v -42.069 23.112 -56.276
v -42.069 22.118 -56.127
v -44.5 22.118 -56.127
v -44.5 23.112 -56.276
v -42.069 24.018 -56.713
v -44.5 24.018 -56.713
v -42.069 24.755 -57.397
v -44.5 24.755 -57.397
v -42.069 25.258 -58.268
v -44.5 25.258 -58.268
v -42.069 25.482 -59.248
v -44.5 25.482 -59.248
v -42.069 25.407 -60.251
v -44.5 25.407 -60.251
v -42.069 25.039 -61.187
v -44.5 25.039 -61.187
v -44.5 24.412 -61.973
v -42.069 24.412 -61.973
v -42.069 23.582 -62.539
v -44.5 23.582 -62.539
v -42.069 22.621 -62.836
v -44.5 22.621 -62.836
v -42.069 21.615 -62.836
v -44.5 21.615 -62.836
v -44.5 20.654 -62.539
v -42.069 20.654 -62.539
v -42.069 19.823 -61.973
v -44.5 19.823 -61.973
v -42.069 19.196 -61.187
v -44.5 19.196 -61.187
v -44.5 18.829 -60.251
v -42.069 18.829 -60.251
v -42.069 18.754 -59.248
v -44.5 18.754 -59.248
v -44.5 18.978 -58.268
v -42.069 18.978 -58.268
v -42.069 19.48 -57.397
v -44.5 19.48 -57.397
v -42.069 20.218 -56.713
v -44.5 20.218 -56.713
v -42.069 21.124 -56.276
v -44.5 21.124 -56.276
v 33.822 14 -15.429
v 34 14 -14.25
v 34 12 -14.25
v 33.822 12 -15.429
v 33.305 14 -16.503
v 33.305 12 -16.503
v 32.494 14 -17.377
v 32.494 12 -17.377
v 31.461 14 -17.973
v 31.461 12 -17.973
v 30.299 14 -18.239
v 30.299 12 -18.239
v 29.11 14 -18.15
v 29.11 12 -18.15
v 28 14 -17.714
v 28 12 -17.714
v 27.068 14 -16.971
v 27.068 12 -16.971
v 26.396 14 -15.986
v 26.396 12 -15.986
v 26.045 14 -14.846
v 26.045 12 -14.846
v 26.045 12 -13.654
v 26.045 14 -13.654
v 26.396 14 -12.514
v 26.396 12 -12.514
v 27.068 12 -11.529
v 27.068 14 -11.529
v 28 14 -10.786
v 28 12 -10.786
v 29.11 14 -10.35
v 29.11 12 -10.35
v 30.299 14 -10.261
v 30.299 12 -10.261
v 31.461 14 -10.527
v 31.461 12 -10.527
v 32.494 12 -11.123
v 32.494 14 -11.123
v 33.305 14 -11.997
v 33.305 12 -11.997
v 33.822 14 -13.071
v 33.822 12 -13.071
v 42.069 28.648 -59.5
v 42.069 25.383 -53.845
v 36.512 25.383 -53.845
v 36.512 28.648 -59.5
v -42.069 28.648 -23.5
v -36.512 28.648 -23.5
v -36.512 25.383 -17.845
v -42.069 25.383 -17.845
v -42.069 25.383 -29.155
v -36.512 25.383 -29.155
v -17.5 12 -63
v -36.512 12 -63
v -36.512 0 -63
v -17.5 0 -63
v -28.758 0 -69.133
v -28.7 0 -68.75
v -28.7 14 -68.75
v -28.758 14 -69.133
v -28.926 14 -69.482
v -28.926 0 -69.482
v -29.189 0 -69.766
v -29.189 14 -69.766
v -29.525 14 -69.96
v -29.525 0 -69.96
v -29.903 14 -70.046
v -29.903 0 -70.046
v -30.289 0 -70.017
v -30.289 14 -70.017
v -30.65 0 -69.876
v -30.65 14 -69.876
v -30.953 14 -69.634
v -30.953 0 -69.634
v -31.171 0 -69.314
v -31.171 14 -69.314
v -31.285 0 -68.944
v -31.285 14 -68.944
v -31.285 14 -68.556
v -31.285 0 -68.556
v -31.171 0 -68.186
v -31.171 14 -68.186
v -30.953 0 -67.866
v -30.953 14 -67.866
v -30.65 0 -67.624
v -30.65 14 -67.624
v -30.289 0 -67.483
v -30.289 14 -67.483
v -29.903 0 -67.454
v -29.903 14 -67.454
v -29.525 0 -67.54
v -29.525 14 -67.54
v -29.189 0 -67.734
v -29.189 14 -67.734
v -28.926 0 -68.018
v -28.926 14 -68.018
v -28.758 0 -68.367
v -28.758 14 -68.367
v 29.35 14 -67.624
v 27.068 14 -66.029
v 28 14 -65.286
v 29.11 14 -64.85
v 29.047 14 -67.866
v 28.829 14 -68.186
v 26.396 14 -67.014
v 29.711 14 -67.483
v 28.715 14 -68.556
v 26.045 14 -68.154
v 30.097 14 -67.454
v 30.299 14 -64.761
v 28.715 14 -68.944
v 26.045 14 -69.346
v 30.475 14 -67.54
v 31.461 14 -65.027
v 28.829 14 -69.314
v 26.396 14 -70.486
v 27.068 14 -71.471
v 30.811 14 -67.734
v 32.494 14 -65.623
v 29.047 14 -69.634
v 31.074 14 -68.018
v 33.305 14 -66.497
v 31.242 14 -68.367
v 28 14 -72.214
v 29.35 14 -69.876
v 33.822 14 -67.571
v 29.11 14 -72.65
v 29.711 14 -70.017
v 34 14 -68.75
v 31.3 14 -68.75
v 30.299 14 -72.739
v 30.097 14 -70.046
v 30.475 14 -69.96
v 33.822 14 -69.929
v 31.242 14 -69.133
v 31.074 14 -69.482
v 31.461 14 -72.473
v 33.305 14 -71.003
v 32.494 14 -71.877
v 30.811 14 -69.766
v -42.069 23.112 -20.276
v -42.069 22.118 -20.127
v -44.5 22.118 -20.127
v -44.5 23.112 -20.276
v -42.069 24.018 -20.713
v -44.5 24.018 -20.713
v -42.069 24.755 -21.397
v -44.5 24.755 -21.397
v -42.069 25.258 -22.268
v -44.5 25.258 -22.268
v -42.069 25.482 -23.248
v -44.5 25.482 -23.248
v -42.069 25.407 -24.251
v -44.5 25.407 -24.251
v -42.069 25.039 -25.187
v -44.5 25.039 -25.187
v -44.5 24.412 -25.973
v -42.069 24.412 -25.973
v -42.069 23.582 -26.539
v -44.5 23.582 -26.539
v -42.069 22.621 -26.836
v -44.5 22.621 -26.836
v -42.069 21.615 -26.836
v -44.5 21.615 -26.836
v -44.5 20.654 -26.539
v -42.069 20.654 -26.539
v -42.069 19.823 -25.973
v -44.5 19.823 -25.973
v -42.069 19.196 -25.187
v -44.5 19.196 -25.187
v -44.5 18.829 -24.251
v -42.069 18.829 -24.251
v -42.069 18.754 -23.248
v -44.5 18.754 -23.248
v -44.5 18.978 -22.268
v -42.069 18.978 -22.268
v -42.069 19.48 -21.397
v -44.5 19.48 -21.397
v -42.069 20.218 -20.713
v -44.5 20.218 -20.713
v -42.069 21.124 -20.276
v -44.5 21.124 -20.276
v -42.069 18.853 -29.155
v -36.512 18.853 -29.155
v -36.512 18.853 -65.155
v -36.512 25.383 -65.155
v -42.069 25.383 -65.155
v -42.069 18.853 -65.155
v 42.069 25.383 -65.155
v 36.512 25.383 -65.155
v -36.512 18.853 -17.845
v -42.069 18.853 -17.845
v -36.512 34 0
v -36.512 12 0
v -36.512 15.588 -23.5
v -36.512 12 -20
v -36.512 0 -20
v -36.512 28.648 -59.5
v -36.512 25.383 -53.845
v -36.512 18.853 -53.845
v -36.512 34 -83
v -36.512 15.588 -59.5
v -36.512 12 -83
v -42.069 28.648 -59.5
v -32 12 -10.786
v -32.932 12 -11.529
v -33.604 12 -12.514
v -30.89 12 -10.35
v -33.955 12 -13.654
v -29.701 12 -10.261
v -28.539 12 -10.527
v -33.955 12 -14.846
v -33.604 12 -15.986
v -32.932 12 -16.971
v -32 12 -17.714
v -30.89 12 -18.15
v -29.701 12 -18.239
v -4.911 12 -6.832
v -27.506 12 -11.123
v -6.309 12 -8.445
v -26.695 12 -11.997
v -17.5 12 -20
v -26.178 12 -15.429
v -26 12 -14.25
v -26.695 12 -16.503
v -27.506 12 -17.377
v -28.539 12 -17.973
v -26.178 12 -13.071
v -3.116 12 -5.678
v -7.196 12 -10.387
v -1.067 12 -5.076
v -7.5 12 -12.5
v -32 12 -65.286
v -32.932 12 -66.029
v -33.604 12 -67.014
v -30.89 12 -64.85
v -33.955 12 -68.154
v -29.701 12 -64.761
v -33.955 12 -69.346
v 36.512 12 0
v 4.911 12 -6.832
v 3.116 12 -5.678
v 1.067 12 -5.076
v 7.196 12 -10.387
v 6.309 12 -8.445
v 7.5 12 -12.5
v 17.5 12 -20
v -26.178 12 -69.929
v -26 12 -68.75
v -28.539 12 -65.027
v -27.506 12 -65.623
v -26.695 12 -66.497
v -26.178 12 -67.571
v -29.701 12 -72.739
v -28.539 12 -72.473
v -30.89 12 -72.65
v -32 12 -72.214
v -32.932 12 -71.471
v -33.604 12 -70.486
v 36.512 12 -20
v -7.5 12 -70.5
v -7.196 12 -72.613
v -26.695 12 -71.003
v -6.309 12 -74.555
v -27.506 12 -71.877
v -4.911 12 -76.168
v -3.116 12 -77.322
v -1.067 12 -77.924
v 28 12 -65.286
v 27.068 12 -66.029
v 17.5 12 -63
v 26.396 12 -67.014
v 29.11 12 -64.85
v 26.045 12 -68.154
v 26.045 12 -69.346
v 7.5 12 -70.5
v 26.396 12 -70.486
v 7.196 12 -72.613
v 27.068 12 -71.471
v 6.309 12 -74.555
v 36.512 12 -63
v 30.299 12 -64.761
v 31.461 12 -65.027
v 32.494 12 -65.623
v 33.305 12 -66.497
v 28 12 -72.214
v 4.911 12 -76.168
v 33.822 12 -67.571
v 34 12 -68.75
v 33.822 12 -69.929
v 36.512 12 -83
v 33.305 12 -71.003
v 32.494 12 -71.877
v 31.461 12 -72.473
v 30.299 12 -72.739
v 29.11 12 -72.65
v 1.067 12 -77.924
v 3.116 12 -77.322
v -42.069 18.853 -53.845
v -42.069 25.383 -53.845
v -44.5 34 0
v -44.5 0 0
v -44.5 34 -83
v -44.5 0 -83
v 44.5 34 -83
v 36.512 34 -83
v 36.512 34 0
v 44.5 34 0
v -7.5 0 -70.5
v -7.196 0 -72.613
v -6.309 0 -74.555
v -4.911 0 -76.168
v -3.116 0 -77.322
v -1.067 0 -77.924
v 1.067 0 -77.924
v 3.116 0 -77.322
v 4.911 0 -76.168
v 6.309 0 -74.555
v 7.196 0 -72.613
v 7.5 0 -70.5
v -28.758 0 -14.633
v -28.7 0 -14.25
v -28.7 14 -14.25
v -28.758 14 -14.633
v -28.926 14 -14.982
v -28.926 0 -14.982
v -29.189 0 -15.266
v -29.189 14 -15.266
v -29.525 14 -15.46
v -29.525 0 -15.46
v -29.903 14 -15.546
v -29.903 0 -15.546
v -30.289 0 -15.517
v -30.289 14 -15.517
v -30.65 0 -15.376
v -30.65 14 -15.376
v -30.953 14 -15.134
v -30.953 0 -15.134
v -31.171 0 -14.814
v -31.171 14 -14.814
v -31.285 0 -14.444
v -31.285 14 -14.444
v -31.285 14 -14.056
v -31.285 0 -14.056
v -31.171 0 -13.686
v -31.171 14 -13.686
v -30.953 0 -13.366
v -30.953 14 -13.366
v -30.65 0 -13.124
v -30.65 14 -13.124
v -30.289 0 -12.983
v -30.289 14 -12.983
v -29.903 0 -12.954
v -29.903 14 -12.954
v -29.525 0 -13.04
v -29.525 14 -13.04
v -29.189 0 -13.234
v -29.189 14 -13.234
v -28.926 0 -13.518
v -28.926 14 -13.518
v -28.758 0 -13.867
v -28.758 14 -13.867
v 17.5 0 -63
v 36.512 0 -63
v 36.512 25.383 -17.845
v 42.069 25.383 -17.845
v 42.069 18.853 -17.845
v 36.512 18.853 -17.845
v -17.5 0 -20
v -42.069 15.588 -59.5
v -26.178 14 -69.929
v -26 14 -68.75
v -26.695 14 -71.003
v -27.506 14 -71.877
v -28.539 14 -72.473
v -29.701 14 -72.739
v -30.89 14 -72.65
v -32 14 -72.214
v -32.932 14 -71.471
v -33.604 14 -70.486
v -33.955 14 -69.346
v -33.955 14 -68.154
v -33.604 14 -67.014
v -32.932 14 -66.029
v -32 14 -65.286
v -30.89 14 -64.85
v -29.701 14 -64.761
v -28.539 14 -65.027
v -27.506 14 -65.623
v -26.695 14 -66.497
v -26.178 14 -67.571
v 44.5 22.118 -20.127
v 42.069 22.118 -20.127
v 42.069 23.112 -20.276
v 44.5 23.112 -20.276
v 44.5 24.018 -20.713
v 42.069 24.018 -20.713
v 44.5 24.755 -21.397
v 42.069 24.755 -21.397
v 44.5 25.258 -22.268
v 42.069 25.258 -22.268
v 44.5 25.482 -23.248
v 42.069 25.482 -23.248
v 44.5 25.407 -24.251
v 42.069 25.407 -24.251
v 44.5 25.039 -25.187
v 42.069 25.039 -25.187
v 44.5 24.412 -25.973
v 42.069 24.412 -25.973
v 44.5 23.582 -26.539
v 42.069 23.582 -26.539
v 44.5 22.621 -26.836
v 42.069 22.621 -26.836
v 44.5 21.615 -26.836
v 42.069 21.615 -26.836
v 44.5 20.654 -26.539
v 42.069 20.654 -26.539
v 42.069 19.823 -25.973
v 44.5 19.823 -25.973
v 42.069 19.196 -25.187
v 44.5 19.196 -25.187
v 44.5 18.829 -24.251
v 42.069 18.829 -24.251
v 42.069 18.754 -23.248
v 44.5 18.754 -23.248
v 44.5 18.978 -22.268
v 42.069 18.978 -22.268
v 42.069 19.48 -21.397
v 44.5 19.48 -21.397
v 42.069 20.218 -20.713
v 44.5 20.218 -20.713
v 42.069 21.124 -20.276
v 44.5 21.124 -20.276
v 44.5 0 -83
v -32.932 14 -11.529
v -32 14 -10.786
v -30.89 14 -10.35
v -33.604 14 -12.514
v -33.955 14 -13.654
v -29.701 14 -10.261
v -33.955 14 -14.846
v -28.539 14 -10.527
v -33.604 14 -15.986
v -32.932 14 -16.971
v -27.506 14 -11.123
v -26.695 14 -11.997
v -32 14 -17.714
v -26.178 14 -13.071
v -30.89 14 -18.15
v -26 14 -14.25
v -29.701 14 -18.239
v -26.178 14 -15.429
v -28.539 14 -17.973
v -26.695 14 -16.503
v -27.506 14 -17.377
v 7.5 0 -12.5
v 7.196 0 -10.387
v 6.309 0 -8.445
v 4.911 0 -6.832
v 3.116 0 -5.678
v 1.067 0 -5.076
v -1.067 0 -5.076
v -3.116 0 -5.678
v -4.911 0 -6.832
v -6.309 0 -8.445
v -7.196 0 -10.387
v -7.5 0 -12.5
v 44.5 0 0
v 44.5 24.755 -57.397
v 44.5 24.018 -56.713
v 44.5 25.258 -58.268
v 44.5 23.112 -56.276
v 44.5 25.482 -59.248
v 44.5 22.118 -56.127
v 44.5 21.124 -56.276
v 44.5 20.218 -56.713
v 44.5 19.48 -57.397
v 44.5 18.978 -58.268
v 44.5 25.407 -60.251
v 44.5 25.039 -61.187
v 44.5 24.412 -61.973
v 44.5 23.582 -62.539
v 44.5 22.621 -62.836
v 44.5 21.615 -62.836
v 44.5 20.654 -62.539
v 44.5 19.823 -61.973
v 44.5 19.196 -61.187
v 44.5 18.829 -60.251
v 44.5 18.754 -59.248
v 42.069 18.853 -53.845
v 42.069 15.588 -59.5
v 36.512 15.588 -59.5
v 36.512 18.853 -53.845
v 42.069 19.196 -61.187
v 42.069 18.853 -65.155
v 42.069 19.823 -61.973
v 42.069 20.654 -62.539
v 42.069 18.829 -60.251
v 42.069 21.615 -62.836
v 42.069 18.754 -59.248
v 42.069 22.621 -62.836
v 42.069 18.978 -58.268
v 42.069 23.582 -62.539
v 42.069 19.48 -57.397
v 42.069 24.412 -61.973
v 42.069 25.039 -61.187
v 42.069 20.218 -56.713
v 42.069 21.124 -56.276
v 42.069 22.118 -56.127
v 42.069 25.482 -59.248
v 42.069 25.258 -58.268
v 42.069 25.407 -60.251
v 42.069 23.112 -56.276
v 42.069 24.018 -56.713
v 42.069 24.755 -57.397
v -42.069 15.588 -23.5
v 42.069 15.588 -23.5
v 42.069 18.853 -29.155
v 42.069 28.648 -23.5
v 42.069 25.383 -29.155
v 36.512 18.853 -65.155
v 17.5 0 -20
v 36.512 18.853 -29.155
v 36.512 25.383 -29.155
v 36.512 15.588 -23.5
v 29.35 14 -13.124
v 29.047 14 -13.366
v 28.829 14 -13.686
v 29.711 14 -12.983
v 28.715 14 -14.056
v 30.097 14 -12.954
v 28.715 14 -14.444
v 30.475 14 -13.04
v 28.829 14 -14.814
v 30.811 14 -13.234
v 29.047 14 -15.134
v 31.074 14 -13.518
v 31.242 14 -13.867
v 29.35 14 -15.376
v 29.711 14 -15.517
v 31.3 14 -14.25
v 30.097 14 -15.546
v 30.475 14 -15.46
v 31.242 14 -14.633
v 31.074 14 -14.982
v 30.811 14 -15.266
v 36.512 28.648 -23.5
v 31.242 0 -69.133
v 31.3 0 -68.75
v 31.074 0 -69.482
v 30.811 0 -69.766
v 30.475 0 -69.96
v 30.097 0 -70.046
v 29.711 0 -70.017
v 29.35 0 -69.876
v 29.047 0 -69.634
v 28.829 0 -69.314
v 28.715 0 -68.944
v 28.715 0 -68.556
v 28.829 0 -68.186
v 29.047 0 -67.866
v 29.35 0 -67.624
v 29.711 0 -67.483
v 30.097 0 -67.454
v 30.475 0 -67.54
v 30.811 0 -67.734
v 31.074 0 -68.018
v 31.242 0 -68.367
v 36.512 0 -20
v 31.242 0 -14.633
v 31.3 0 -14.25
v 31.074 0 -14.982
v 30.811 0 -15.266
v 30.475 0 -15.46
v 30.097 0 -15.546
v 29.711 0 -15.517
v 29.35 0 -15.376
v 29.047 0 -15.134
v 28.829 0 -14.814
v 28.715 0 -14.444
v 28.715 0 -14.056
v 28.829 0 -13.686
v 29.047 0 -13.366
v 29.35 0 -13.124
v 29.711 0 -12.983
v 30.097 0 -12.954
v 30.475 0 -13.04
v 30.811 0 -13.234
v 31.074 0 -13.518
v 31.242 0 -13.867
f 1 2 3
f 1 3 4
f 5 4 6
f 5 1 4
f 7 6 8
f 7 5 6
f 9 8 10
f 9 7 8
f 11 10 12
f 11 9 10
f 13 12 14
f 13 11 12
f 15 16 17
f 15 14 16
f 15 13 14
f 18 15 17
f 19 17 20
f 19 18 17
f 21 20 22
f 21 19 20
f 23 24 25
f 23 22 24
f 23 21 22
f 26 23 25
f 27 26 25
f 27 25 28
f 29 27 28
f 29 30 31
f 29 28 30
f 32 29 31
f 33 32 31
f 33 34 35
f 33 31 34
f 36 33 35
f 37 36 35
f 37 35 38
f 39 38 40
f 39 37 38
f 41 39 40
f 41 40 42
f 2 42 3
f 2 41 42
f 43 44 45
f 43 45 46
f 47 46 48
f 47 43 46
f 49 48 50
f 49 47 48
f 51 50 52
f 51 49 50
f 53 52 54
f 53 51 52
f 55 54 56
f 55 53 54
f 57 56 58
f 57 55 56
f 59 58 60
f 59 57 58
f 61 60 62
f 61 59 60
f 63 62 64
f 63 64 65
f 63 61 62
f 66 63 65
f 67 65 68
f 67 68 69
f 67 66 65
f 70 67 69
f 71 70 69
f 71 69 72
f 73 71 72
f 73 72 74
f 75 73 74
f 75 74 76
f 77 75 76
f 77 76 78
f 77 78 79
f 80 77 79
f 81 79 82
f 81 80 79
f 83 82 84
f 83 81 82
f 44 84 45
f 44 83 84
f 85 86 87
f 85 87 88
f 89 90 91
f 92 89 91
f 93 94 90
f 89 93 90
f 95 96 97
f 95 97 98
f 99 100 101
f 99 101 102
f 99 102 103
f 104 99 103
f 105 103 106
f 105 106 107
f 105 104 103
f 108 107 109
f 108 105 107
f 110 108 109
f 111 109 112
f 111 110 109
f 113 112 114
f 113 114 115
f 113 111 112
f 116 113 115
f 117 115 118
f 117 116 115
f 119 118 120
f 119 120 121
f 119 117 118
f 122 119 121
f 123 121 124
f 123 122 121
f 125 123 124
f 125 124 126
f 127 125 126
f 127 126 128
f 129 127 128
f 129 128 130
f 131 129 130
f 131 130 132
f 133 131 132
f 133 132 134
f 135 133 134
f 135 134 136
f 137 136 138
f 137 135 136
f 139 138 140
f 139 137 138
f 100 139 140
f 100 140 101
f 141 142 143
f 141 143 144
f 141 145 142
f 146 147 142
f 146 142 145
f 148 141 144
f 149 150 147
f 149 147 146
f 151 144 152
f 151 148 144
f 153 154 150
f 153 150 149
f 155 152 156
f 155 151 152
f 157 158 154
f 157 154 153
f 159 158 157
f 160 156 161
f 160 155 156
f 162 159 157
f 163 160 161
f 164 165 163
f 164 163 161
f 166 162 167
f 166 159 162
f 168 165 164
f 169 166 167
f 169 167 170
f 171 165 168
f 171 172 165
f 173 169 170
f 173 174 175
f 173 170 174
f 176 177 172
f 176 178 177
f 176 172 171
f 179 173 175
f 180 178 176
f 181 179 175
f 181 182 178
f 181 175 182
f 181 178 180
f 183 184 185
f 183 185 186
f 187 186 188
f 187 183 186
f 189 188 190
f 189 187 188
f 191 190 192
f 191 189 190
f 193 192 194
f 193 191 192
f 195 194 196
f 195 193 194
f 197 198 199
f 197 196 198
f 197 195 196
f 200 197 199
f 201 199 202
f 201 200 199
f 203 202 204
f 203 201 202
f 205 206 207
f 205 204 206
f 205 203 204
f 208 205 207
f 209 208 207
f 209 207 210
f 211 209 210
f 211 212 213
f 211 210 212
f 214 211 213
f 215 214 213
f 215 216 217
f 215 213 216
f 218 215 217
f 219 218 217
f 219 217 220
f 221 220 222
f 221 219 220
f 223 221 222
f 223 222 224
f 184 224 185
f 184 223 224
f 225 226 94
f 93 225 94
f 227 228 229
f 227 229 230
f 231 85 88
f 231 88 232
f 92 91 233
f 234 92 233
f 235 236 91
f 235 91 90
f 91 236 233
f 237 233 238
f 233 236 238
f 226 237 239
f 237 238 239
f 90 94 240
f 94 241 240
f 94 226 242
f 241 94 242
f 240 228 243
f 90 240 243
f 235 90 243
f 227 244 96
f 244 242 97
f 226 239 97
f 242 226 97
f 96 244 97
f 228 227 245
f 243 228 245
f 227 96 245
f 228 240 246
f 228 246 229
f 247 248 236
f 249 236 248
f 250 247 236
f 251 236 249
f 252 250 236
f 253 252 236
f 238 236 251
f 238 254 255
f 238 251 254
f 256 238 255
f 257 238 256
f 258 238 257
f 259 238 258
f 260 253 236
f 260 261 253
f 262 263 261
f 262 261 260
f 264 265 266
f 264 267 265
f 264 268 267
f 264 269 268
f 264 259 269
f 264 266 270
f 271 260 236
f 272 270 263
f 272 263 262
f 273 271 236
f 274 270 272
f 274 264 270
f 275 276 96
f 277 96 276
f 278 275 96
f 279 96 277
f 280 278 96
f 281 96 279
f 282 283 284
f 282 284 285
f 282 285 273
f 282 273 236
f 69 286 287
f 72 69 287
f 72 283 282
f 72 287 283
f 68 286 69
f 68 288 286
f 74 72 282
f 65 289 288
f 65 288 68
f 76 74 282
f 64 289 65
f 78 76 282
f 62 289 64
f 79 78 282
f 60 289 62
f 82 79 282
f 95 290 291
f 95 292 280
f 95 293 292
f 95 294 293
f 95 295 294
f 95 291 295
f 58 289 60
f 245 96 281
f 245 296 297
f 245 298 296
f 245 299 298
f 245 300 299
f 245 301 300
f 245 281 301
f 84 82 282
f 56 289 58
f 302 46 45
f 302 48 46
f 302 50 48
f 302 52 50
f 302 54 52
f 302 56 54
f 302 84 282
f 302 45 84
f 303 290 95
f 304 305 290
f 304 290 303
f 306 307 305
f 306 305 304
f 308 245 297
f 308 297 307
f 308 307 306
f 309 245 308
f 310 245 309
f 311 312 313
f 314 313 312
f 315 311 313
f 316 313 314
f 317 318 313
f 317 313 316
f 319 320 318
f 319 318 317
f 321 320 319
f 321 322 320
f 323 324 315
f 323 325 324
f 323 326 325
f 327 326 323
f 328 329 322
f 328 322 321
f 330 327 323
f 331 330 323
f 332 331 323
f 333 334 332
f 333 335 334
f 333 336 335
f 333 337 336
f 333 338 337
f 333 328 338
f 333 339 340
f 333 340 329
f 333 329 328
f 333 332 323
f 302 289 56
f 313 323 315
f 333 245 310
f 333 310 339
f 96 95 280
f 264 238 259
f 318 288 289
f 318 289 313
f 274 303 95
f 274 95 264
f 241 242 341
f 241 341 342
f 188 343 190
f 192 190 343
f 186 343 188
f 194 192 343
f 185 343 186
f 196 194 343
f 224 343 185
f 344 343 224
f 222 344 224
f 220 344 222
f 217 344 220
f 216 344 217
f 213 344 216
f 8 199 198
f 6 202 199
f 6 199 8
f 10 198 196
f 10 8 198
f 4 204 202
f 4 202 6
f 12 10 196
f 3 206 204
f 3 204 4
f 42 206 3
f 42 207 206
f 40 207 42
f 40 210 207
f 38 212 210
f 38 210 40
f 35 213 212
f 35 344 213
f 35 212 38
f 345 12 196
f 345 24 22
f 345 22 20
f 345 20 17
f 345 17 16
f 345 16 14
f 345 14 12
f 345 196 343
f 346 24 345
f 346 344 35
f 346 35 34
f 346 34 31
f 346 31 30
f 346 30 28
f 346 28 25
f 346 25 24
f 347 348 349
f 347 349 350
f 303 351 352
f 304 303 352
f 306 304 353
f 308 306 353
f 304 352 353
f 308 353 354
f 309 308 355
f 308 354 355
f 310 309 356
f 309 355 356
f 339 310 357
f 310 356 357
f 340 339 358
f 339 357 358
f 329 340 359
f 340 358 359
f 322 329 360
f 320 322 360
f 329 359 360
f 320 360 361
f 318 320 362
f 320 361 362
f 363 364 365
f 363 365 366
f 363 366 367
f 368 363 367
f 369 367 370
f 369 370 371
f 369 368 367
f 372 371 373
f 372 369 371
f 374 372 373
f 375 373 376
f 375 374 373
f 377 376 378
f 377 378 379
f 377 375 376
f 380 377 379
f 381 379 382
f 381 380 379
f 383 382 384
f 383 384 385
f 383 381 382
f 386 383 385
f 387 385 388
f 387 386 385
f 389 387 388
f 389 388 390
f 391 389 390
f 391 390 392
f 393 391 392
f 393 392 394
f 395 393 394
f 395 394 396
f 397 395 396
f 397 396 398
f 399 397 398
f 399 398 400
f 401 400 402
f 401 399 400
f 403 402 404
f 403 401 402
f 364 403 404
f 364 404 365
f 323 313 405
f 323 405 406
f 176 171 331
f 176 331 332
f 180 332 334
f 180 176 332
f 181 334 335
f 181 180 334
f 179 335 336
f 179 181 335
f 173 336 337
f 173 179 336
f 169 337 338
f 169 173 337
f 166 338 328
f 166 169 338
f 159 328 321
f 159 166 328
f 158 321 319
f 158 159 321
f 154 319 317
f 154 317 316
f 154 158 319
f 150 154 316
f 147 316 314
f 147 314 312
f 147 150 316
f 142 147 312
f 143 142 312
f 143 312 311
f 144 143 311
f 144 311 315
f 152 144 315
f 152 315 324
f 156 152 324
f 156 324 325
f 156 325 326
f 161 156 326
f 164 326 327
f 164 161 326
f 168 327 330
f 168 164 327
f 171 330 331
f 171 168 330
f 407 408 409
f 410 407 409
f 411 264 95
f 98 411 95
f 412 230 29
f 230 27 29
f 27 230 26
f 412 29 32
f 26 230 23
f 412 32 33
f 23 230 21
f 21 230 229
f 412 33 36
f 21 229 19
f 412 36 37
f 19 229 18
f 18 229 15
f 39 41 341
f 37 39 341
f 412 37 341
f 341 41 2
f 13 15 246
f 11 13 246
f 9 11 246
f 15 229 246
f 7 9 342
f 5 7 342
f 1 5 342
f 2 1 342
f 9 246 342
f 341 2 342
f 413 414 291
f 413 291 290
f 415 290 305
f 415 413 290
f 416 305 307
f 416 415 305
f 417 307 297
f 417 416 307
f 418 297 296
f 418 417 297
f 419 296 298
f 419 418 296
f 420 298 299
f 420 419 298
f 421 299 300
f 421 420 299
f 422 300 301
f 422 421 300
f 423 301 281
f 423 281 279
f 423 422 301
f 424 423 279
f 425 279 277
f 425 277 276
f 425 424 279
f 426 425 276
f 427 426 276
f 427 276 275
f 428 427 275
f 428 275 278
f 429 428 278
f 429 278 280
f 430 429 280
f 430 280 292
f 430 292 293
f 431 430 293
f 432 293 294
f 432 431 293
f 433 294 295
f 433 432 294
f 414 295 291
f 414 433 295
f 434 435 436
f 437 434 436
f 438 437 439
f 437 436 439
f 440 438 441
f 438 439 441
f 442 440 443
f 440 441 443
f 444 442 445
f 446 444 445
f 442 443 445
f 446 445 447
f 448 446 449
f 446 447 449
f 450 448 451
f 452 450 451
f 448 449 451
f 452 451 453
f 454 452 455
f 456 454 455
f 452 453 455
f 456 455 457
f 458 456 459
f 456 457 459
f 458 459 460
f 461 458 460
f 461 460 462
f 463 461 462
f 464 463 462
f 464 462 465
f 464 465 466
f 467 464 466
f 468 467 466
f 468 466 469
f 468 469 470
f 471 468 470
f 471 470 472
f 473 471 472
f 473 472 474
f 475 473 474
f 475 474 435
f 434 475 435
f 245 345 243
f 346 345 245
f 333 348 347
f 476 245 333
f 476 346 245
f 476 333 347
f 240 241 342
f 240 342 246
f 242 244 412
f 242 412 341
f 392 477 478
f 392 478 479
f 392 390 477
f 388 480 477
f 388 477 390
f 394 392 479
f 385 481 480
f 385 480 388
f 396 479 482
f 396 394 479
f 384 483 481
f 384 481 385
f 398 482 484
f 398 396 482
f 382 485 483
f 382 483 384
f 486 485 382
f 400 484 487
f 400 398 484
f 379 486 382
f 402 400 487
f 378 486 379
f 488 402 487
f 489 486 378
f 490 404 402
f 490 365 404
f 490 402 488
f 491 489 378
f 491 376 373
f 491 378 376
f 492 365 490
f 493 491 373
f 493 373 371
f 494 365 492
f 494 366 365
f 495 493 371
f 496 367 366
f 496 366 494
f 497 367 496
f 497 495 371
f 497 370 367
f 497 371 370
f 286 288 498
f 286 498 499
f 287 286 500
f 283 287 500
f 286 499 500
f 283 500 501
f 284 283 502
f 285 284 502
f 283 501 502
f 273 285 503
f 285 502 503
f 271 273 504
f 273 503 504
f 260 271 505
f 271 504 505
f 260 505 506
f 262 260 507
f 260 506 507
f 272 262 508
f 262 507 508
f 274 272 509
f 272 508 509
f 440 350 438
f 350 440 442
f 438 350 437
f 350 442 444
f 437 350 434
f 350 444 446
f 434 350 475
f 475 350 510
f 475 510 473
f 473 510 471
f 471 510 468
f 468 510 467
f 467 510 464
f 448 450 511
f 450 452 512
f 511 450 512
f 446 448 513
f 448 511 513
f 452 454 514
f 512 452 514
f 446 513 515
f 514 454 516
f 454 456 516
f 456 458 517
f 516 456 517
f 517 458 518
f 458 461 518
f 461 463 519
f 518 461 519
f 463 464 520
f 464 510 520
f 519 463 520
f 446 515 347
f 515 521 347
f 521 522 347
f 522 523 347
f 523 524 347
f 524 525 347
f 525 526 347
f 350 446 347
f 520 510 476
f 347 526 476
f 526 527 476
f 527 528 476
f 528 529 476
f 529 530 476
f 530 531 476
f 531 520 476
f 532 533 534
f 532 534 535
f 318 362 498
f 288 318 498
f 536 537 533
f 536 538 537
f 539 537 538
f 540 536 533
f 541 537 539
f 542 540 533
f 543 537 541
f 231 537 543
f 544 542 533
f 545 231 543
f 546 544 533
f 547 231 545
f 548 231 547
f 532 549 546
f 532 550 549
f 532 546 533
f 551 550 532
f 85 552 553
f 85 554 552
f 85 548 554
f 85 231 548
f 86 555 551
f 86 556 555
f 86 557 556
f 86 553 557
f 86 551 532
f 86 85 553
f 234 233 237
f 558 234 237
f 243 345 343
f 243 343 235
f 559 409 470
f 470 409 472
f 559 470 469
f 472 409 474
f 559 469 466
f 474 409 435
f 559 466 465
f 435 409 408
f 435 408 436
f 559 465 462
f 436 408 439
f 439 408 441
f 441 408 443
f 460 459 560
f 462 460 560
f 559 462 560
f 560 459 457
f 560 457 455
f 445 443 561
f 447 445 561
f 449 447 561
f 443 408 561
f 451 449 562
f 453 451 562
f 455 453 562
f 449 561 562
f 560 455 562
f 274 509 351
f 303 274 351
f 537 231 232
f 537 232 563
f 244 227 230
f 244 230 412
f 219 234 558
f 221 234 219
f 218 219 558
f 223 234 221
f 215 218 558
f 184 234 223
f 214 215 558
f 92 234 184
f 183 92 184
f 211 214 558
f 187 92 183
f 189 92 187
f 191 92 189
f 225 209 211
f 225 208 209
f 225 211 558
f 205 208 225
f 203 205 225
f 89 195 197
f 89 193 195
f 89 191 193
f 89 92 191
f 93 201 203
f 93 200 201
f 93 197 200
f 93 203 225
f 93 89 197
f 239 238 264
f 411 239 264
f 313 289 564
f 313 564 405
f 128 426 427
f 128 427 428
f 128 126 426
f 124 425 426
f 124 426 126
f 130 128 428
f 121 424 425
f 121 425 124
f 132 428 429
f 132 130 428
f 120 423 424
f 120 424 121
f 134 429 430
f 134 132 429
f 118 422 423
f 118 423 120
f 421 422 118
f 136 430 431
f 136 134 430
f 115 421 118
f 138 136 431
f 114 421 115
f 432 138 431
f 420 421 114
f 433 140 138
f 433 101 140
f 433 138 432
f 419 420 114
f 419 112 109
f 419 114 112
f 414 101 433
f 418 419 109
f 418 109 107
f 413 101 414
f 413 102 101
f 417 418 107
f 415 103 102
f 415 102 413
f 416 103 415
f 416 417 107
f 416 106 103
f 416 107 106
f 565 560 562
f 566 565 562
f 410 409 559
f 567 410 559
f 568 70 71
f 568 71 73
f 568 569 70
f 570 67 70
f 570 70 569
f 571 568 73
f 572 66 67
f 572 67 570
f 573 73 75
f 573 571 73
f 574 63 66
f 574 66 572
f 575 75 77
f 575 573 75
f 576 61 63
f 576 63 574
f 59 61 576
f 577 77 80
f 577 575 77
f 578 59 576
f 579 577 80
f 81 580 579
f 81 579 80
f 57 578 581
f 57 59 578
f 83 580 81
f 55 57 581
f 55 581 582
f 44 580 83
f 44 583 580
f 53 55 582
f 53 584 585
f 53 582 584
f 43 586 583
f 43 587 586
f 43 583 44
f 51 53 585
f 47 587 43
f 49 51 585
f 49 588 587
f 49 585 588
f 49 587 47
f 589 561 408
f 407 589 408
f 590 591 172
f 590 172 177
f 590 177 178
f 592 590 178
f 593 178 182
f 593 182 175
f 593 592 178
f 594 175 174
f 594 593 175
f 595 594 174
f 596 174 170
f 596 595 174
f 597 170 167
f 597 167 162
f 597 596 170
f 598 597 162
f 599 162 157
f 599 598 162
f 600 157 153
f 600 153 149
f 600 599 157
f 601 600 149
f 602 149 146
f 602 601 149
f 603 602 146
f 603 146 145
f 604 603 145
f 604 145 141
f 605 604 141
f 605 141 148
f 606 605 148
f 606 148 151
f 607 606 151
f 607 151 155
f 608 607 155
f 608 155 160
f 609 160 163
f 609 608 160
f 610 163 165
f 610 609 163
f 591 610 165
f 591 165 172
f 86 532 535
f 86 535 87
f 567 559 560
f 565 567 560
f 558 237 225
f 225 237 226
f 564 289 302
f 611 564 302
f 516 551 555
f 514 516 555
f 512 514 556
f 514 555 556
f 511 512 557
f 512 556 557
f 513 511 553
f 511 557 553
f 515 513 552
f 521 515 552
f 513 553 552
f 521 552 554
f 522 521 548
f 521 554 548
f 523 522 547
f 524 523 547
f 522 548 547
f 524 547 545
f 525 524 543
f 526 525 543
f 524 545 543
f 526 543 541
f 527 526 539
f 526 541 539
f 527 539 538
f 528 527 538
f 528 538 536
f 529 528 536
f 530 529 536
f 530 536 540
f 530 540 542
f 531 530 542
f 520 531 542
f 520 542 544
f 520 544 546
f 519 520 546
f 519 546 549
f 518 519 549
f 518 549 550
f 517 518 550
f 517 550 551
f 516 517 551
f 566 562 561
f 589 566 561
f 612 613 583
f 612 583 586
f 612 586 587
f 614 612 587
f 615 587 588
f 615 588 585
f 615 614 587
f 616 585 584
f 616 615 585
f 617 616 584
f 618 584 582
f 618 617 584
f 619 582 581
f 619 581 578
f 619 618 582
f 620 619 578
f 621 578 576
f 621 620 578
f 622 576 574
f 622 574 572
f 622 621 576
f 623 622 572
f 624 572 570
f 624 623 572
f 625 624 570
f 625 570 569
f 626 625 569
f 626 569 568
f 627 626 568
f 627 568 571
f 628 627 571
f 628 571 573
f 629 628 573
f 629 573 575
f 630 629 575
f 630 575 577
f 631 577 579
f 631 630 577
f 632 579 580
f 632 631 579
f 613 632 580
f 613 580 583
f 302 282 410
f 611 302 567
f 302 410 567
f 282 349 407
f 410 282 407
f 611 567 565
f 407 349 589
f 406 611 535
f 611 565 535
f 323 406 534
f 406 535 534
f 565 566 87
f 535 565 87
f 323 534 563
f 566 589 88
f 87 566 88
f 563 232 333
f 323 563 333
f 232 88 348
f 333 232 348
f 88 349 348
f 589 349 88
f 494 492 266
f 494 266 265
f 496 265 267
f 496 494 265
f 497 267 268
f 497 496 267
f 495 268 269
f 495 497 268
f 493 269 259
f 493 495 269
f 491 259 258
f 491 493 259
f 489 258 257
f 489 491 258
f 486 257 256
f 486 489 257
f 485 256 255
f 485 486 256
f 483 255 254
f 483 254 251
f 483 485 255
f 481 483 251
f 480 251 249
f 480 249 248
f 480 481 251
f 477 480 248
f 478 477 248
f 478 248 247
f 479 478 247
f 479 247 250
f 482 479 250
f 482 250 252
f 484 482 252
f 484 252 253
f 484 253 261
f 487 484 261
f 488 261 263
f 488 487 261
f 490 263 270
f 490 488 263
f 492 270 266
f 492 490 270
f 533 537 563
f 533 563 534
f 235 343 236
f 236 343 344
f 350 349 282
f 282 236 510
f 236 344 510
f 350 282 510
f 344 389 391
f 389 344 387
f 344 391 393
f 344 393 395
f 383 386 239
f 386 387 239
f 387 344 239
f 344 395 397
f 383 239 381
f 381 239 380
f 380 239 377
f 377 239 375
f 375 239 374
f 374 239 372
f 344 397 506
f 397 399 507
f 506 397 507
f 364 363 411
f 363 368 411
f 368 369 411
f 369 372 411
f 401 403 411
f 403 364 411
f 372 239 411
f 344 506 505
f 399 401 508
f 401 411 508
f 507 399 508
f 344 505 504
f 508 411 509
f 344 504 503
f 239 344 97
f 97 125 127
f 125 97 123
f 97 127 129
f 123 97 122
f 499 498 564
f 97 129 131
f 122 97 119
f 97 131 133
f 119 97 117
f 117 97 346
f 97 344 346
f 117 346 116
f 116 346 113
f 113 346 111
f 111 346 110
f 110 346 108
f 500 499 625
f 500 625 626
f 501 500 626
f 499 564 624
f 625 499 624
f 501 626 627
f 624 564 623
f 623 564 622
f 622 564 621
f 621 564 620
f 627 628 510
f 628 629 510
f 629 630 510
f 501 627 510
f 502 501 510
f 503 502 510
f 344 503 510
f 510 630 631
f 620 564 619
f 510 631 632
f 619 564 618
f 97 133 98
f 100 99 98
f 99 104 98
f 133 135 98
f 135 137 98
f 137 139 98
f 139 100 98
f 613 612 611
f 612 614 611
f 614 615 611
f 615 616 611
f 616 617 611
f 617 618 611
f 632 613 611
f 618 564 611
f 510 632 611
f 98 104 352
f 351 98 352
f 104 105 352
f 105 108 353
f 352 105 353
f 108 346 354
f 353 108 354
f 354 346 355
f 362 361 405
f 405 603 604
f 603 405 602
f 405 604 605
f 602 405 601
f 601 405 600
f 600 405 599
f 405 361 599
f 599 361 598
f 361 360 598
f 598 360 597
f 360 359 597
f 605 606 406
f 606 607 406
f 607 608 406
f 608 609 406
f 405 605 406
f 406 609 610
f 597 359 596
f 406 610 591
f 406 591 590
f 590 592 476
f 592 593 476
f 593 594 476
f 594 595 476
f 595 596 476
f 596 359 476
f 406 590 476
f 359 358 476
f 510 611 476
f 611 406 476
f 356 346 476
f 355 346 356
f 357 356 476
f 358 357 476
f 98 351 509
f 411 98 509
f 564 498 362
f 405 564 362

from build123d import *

# Parameters (mm, degrees)
SKETCH1_W                     = 89
SKETCH1_H                     = 83
SKETCH1_R                     = 1.3
MAIN_BODY_DEPTH               = 14
SKETCH2_W                     = 73.025
SKETCH2_H                     = 83
SKETCH2_R                     = 4
SCREW_RISER_DEPTH             = 2
SKETCH4_W                     = 7.9875
SKETCH4_H                     = 83
TOPPER_SUPPORT_DEPTH          = 20
MOUNT_START                   = -86.56875
MOUNT_NUTS_DEPTH              = 84.1375
SKETCH5_R                     = 3.3734375
F_9_32_MOUNT_HOLES_DEPTH      = 8.9875
F_9_32_MOUNT_HOLES_DEPTH_BACK = 82.0125
SKETCH8_W                     = 19.0125
SKETCH8_H                     = 43
MIDDLE_CUT_DEPTH              = 14


with BuildPart() as part:
    # Sketch1 → Main Body (new body)
    with BuildSketch(Plane(origin=(0, 0, 0), x_dir=(1, 0, 0), z_dir=(0, 1, 0))):
        with Locations((0, 41.5)):
            Rectangle(SKETCH1_W, SKETCH1_H)
        with Locations((-30, 14.25)):
            Circle(SKETCH1_R, mode=Mode.SUBTRACT)
        with Locations((30, 14.25)):
            Circle(SKETCH1_R, mode=Mode.SUBTRACT)
        with BuildLine():
            Line((-7.5, 12.5), (-7.5, 70.5))
            ThreePointArc((-7.5, 70.5), (0, 78), (7.5, 70.5))
            Line((7.5, 70.5), (7.5, 12.5))
            ThreePointArc((7.5, 12.5), (0, 5), (-7.5, 12.5))
        make_face(mode=Mode.SUBTRACT)
        with Locations((-30, 68.75)):
            Circle(SKETCH1_R, mode=Mode.SUBTRACT)
        with Locations((30, 68.75)):
            Circle(SKETCH1_R, mode=Mode.SUBTRACT)
    extrude(amount=MAIN_BODY_DEPTH)

    # Sketch2 → Screw Riser (cut)
    with BuildSketch(Plane(origin=(0, 14, 0), x_dir=(1, 0, 0), z_dir=(0, 1, 0))):
        with Locations((0, 41.5)):
            Rectangle(SKETCH2_W, SKETCH2_H)
        with Locations((-30, 14.25)):
            Circle(SKETCH2_R, mode=Mode.SUBTRACT)
        with Locations((30, 14.25)):
            Circle(SKETCH2_R, mode=Mode.SUBTRACT)
        with Locations((-30, 68.75)):
            Circle(SKETCH2_R, mode=Mode.SUBTRACT)
        with Locations((30, 68.75)):
            Circle(SKETCH2_R, mode=Mode.SUBTRACT)
    extrude(amount=-SCREW_RISER_DEPTH, mode=Mode.SUBTRACT)

    # Sketch4 → Topper Support (add)
    with BuildSketch(Plane(origin=(0, 14, 0), x_dir=(1, 0, 0), z_dir=(0, 1, 0))):
        with Locations((-40.50625, 41.5)):
            Rectangle(SKETCH4_W, SKETCH4_H)
        with Locations((40.50625, 41.5)):
            Rectangle(SKETCH4_W, SKETCH4_H)
    extrude(amount=TOPPER_SUPPORT_DEPTH)

    # Sketch6 → Mount Nuts (cut)
    with BuildSketch(Plane.ZY.offset(44.5).offset(MOUNT_START)):
        Polygon((-59.5, 15.5875), (-53.84453125, 18.852686405), (-53.84453125, 25.383059216), (-59.5, 28.648245621), (-65.15546875, 25.383059216), (-65.15546875, 18.852686405), align=None)
        Polygon((-17.84453125, 18.852686405), (-23.5, 15.5875), (-29.15546875, 18.852686405), (-29.15546875, 25.383059216), (-23.5, 28.648245621), (-17.84453125, 25.383059216), align=None)
    extrude(amount=MOUNT_NUTS_DEPTH, mode=Mode.SUBTRACT)

    # Sketch5 → 9_32 Mount Holes (cut, two sides)
    with BuildSketch(Plane.ZY.offset(36.5125)) as f_9_32_mount_holes_sk:
        with Locations((-59.5, 22.11787281)):
            Circle(SKETCH5_R)
        with Locations((-23.5, 22.11787281)):
            Circle(SKETCH5_R)
    extrude(amount=F_9_32_MOUNT_HOLES_DEPTH, mode=Mode.SUBTRACT)
    extrude(f_9_32_mount_holes_sk.sketch, amount=-F_9_32_MOUNT_HOLES_DEPTH_BACK, mode=Mode.SUBTRACT)

    # Sketch8 → Middle Cut (cut)
    with BuildSketch(Plane(origin=(0, 14, 0), x_dir=(1, 0, 0), z_dir=(0, 1, 0))):
        with Locations((-27.00625, 41.5)):
            Rectangle(SKETCH8_W, SKETCH8_H)
        with Locations((27.00625, 41.5)):
            Rectangle(SKETCH8_W, SKETCH8_H)
    extrude(amount=-MIDDLE_CUT_DEPTH, mode=Mode.SUBTRACT)


solid = part.part
